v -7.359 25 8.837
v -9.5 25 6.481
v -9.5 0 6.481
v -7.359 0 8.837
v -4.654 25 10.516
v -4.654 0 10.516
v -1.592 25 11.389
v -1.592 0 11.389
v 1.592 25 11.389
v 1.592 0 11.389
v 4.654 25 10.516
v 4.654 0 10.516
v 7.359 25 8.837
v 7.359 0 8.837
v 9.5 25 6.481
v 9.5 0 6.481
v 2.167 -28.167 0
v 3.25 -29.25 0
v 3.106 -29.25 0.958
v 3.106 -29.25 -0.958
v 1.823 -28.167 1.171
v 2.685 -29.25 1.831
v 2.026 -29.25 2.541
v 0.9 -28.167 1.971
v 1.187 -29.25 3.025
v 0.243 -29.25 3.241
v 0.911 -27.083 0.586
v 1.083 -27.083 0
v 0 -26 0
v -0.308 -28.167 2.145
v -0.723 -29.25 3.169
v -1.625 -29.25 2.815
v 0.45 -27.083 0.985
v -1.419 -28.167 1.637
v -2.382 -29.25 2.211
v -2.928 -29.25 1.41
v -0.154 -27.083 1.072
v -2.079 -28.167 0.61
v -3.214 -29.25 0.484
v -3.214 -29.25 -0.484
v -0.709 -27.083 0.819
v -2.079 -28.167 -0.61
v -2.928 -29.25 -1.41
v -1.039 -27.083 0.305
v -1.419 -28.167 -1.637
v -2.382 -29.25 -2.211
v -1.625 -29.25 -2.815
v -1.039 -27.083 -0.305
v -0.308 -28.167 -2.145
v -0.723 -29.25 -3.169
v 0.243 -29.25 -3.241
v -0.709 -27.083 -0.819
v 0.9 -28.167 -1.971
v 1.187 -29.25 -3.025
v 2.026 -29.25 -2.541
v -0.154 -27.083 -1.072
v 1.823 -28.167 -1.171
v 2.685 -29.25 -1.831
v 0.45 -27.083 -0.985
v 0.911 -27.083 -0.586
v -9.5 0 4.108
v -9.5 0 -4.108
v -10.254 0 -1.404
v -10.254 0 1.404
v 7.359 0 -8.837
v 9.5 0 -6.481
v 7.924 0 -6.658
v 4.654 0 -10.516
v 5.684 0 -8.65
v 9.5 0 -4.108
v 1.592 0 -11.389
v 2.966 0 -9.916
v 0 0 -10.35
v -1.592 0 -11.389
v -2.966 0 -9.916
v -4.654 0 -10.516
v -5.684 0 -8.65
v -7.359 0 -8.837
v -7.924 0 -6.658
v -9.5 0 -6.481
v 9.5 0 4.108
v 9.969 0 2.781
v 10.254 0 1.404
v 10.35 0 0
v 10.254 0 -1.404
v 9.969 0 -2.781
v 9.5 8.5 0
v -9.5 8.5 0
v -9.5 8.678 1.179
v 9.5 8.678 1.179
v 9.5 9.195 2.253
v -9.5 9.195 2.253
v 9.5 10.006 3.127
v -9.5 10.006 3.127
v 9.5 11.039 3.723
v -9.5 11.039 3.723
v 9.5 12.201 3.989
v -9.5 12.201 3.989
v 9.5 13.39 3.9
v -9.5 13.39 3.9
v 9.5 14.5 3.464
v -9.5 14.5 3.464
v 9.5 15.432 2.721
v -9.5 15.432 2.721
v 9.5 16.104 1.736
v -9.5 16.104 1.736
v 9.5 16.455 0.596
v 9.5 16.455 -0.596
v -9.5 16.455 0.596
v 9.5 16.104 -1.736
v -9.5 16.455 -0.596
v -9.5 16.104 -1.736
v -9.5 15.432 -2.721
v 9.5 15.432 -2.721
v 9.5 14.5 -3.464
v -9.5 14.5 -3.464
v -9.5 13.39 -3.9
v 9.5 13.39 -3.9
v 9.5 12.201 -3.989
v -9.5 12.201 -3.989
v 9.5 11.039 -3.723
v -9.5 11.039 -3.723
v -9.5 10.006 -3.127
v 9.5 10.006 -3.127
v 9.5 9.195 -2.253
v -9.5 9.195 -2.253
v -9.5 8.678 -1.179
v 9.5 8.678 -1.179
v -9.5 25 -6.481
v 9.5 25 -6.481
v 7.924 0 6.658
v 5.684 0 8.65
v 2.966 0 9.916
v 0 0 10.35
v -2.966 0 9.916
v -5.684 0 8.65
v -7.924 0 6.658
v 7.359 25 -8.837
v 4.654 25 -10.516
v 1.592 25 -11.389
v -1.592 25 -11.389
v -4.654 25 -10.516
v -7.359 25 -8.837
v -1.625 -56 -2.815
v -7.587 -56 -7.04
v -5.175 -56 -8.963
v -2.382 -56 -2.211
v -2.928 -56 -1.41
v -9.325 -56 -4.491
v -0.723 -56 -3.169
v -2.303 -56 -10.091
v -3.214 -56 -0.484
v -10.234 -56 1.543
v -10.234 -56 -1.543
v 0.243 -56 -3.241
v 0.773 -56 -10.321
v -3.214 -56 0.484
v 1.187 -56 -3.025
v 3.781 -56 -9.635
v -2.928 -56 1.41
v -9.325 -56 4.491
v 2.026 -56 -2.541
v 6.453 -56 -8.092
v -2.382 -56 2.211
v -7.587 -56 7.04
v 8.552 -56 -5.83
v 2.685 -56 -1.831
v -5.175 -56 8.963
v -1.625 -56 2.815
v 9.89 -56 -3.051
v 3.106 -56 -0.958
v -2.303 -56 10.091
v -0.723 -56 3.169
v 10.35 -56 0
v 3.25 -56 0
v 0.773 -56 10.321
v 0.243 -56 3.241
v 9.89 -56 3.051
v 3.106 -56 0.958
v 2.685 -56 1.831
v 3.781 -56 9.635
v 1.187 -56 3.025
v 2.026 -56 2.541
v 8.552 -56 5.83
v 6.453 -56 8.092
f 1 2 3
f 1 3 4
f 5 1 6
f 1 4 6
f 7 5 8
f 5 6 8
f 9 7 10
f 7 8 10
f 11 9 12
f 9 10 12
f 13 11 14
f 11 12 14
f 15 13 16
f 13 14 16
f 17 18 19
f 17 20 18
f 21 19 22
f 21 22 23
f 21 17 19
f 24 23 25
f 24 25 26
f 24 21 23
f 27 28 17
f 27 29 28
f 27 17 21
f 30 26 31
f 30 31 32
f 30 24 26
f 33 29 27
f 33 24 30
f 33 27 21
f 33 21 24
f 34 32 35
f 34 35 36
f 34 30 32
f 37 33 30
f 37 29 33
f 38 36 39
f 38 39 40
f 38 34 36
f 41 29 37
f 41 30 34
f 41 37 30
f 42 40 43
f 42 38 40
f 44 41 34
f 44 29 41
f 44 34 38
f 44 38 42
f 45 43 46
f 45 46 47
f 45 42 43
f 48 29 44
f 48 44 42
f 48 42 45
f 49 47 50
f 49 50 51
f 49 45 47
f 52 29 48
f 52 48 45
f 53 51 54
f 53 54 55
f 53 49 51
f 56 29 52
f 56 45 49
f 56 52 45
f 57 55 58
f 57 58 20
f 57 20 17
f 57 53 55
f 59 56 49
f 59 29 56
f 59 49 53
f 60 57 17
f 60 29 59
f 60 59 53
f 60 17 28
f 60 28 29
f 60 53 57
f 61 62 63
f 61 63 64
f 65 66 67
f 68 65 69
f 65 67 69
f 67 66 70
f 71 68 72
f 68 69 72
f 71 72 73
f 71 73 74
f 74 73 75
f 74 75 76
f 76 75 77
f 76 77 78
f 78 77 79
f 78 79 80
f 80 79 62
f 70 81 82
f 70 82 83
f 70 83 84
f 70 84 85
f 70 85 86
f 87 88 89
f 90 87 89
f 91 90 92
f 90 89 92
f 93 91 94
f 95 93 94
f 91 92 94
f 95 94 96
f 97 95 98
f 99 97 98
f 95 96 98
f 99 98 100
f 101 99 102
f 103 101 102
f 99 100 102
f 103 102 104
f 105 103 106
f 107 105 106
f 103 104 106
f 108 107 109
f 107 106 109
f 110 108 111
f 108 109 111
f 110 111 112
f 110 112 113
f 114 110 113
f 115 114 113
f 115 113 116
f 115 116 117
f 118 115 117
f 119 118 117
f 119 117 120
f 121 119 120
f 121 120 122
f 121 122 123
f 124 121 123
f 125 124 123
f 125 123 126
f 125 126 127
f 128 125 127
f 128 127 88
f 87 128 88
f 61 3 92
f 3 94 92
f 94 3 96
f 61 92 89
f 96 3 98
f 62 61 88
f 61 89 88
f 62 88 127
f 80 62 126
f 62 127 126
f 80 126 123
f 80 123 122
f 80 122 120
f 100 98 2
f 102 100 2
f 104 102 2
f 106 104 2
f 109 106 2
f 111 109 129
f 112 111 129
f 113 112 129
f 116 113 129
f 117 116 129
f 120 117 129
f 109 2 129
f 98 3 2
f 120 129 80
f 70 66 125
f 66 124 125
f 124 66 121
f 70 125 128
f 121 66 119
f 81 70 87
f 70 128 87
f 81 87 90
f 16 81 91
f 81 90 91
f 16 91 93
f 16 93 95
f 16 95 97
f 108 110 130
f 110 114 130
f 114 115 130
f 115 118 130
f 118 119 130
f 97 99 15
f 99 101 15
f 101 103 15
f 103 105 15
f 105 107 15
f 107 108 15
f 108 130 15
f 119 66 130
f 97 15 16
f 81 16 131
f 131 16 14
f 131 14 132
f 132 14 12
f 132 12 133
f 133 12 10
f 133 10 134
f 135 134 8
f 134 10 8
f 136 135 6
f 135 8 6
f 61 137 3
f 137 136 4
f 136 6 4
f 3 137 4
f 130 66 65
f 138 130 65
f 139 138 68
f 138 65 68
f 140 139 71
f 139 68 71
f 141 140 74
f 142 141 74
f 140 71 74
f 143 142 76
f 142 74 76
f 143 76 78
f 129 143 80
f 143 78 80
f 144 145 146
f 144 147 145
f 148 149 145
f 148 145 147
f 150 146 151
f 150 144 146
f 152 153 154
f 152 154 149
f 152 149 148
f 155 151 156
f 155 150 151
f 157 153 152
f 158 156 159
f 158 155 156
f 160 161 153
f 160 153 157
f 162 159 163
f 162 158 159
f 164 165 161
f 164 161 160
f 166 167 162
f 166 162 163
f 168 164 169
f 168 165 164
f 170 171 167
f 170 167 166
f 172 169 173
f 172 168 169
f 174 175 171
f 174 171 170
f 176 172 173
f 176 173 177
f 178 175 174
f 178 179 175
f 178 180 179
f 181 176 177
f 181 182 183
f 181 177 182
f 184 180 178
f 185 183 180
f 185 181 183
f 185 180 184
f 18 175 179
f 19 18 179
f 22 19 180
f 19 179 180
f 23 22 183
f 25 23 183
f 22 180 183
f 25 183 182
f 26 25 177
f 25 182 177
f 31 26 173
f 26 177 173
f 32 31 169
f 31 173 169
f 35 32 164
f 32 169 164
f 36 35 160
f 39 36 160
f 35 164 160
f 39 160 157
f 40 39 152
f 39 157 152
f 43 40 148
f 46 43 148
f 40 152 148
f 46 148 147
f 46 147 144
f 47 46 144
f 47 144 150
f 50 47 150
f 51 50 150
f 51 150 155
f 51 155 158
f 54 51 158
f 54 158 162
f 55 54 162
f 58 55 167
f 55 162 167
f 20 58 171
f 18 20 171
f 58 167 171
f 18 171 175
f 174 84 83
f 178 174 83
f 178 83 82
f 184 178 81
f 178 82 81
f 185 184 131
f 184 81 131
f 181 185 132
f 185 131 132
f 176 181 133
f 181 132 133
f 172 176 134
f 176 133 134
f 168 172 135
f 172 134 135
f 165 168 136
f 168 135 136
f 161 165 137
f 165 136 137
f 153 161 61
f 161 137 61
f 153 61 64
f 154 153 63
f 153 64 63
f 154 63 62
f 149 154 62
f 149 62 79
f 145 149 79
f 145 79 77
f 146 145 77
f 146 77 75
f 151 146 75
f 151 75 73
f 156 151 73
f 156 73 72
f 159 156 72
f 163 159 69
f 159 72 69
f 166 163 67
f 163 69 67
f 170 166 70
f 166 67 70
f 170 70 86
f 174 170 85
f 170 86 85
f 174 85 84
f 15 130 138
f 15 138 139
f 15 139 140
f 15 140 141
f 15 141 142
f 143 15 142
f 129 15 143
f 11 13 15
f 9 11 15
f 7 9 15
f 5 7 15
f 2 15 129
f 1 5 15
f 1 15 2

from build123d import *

# Parameters (mm, degrees)
F0_R     = 10.35
F1_DEPTH = 56
F2_R     = 11.5
F3_DEPTH = 25
F5_DEPTH = 25
F6_R     = 4
F7_DEPTH = 25
F8_R     = 3.25
F9_DEPTH = 30
F10_SIZE = 3.25


with BuildPart() as f1:
    # F0 (on Front) → F1 (new body)
    with BuildSketch(Plane.XZ):
        Circle(F0_R)
    extrude(amount=F1_DEPTH)

    # F2 (on face) → F3 (join)
    with BuildSketch(Plane(origin=(0, 0, 0), x_dir=(-1, 0, 0), z_dir=(0, 1, 0))):
        Circle(F2_R)
    extrude(amount=F3_DEPTH)

    # F4 (on face) → F5 (cut, through all)
    with BuildSketch(Plane(origin=(0, 25, 0), x_dir=(-1, 0, 0), z_dir=(0, 1, 0))):
        with BuildLine():
            Line((-9.5, -6.4807406984), (-9.5, 6.4807406984))
            ThreePointArc((-9.5, 6.4807406984), (-11.5, 0), (-9.5, -6.4807406984))
        make_face()
        with BuildLine():
            ThreePointArc((11.5, 0), (10.9886304879, 3.3911649916), (9.5, 6.4807406984))
            Line((9.5, 6.4807406984), (9.5, -6.4807406984))
            ThreePointArc((9.5, -6.4807406984), (10.9886304879, -3.3911649916), (11.5, 0))
        make_face()
    extrude(amount=-F5_DEPTH, mode=Mode.SUBTRACT)

    # F6 (on face) → F7 (cut)
    with BuildSketch(Plane(origin=(-9.5, 0, 0), x_dir=(0, -1, 0), z_dir=(-1, 0, 0))):
        with Locations((-12.5, 0)):
            Circle(F6_R)
    extrude(amount=-F7_DEPTH, mode=Mode.SUBTRACT)

    # F8 (on face) → F9 (cut)
    with BuildSketch(Plane.XZ.offset(56)):
        Circle(F8_R)
    extrude(amount=-F9_DEPTH, mode=Mode.SUBTRACT)

    # F10
    f10_edges = [f1.edges().sort_by_distance(p)[0] for p in [
        (-3.25, -26, 0),
    ]]
    chamfer(f10_edges, length=F10_SIZE)


solid = f1.part
